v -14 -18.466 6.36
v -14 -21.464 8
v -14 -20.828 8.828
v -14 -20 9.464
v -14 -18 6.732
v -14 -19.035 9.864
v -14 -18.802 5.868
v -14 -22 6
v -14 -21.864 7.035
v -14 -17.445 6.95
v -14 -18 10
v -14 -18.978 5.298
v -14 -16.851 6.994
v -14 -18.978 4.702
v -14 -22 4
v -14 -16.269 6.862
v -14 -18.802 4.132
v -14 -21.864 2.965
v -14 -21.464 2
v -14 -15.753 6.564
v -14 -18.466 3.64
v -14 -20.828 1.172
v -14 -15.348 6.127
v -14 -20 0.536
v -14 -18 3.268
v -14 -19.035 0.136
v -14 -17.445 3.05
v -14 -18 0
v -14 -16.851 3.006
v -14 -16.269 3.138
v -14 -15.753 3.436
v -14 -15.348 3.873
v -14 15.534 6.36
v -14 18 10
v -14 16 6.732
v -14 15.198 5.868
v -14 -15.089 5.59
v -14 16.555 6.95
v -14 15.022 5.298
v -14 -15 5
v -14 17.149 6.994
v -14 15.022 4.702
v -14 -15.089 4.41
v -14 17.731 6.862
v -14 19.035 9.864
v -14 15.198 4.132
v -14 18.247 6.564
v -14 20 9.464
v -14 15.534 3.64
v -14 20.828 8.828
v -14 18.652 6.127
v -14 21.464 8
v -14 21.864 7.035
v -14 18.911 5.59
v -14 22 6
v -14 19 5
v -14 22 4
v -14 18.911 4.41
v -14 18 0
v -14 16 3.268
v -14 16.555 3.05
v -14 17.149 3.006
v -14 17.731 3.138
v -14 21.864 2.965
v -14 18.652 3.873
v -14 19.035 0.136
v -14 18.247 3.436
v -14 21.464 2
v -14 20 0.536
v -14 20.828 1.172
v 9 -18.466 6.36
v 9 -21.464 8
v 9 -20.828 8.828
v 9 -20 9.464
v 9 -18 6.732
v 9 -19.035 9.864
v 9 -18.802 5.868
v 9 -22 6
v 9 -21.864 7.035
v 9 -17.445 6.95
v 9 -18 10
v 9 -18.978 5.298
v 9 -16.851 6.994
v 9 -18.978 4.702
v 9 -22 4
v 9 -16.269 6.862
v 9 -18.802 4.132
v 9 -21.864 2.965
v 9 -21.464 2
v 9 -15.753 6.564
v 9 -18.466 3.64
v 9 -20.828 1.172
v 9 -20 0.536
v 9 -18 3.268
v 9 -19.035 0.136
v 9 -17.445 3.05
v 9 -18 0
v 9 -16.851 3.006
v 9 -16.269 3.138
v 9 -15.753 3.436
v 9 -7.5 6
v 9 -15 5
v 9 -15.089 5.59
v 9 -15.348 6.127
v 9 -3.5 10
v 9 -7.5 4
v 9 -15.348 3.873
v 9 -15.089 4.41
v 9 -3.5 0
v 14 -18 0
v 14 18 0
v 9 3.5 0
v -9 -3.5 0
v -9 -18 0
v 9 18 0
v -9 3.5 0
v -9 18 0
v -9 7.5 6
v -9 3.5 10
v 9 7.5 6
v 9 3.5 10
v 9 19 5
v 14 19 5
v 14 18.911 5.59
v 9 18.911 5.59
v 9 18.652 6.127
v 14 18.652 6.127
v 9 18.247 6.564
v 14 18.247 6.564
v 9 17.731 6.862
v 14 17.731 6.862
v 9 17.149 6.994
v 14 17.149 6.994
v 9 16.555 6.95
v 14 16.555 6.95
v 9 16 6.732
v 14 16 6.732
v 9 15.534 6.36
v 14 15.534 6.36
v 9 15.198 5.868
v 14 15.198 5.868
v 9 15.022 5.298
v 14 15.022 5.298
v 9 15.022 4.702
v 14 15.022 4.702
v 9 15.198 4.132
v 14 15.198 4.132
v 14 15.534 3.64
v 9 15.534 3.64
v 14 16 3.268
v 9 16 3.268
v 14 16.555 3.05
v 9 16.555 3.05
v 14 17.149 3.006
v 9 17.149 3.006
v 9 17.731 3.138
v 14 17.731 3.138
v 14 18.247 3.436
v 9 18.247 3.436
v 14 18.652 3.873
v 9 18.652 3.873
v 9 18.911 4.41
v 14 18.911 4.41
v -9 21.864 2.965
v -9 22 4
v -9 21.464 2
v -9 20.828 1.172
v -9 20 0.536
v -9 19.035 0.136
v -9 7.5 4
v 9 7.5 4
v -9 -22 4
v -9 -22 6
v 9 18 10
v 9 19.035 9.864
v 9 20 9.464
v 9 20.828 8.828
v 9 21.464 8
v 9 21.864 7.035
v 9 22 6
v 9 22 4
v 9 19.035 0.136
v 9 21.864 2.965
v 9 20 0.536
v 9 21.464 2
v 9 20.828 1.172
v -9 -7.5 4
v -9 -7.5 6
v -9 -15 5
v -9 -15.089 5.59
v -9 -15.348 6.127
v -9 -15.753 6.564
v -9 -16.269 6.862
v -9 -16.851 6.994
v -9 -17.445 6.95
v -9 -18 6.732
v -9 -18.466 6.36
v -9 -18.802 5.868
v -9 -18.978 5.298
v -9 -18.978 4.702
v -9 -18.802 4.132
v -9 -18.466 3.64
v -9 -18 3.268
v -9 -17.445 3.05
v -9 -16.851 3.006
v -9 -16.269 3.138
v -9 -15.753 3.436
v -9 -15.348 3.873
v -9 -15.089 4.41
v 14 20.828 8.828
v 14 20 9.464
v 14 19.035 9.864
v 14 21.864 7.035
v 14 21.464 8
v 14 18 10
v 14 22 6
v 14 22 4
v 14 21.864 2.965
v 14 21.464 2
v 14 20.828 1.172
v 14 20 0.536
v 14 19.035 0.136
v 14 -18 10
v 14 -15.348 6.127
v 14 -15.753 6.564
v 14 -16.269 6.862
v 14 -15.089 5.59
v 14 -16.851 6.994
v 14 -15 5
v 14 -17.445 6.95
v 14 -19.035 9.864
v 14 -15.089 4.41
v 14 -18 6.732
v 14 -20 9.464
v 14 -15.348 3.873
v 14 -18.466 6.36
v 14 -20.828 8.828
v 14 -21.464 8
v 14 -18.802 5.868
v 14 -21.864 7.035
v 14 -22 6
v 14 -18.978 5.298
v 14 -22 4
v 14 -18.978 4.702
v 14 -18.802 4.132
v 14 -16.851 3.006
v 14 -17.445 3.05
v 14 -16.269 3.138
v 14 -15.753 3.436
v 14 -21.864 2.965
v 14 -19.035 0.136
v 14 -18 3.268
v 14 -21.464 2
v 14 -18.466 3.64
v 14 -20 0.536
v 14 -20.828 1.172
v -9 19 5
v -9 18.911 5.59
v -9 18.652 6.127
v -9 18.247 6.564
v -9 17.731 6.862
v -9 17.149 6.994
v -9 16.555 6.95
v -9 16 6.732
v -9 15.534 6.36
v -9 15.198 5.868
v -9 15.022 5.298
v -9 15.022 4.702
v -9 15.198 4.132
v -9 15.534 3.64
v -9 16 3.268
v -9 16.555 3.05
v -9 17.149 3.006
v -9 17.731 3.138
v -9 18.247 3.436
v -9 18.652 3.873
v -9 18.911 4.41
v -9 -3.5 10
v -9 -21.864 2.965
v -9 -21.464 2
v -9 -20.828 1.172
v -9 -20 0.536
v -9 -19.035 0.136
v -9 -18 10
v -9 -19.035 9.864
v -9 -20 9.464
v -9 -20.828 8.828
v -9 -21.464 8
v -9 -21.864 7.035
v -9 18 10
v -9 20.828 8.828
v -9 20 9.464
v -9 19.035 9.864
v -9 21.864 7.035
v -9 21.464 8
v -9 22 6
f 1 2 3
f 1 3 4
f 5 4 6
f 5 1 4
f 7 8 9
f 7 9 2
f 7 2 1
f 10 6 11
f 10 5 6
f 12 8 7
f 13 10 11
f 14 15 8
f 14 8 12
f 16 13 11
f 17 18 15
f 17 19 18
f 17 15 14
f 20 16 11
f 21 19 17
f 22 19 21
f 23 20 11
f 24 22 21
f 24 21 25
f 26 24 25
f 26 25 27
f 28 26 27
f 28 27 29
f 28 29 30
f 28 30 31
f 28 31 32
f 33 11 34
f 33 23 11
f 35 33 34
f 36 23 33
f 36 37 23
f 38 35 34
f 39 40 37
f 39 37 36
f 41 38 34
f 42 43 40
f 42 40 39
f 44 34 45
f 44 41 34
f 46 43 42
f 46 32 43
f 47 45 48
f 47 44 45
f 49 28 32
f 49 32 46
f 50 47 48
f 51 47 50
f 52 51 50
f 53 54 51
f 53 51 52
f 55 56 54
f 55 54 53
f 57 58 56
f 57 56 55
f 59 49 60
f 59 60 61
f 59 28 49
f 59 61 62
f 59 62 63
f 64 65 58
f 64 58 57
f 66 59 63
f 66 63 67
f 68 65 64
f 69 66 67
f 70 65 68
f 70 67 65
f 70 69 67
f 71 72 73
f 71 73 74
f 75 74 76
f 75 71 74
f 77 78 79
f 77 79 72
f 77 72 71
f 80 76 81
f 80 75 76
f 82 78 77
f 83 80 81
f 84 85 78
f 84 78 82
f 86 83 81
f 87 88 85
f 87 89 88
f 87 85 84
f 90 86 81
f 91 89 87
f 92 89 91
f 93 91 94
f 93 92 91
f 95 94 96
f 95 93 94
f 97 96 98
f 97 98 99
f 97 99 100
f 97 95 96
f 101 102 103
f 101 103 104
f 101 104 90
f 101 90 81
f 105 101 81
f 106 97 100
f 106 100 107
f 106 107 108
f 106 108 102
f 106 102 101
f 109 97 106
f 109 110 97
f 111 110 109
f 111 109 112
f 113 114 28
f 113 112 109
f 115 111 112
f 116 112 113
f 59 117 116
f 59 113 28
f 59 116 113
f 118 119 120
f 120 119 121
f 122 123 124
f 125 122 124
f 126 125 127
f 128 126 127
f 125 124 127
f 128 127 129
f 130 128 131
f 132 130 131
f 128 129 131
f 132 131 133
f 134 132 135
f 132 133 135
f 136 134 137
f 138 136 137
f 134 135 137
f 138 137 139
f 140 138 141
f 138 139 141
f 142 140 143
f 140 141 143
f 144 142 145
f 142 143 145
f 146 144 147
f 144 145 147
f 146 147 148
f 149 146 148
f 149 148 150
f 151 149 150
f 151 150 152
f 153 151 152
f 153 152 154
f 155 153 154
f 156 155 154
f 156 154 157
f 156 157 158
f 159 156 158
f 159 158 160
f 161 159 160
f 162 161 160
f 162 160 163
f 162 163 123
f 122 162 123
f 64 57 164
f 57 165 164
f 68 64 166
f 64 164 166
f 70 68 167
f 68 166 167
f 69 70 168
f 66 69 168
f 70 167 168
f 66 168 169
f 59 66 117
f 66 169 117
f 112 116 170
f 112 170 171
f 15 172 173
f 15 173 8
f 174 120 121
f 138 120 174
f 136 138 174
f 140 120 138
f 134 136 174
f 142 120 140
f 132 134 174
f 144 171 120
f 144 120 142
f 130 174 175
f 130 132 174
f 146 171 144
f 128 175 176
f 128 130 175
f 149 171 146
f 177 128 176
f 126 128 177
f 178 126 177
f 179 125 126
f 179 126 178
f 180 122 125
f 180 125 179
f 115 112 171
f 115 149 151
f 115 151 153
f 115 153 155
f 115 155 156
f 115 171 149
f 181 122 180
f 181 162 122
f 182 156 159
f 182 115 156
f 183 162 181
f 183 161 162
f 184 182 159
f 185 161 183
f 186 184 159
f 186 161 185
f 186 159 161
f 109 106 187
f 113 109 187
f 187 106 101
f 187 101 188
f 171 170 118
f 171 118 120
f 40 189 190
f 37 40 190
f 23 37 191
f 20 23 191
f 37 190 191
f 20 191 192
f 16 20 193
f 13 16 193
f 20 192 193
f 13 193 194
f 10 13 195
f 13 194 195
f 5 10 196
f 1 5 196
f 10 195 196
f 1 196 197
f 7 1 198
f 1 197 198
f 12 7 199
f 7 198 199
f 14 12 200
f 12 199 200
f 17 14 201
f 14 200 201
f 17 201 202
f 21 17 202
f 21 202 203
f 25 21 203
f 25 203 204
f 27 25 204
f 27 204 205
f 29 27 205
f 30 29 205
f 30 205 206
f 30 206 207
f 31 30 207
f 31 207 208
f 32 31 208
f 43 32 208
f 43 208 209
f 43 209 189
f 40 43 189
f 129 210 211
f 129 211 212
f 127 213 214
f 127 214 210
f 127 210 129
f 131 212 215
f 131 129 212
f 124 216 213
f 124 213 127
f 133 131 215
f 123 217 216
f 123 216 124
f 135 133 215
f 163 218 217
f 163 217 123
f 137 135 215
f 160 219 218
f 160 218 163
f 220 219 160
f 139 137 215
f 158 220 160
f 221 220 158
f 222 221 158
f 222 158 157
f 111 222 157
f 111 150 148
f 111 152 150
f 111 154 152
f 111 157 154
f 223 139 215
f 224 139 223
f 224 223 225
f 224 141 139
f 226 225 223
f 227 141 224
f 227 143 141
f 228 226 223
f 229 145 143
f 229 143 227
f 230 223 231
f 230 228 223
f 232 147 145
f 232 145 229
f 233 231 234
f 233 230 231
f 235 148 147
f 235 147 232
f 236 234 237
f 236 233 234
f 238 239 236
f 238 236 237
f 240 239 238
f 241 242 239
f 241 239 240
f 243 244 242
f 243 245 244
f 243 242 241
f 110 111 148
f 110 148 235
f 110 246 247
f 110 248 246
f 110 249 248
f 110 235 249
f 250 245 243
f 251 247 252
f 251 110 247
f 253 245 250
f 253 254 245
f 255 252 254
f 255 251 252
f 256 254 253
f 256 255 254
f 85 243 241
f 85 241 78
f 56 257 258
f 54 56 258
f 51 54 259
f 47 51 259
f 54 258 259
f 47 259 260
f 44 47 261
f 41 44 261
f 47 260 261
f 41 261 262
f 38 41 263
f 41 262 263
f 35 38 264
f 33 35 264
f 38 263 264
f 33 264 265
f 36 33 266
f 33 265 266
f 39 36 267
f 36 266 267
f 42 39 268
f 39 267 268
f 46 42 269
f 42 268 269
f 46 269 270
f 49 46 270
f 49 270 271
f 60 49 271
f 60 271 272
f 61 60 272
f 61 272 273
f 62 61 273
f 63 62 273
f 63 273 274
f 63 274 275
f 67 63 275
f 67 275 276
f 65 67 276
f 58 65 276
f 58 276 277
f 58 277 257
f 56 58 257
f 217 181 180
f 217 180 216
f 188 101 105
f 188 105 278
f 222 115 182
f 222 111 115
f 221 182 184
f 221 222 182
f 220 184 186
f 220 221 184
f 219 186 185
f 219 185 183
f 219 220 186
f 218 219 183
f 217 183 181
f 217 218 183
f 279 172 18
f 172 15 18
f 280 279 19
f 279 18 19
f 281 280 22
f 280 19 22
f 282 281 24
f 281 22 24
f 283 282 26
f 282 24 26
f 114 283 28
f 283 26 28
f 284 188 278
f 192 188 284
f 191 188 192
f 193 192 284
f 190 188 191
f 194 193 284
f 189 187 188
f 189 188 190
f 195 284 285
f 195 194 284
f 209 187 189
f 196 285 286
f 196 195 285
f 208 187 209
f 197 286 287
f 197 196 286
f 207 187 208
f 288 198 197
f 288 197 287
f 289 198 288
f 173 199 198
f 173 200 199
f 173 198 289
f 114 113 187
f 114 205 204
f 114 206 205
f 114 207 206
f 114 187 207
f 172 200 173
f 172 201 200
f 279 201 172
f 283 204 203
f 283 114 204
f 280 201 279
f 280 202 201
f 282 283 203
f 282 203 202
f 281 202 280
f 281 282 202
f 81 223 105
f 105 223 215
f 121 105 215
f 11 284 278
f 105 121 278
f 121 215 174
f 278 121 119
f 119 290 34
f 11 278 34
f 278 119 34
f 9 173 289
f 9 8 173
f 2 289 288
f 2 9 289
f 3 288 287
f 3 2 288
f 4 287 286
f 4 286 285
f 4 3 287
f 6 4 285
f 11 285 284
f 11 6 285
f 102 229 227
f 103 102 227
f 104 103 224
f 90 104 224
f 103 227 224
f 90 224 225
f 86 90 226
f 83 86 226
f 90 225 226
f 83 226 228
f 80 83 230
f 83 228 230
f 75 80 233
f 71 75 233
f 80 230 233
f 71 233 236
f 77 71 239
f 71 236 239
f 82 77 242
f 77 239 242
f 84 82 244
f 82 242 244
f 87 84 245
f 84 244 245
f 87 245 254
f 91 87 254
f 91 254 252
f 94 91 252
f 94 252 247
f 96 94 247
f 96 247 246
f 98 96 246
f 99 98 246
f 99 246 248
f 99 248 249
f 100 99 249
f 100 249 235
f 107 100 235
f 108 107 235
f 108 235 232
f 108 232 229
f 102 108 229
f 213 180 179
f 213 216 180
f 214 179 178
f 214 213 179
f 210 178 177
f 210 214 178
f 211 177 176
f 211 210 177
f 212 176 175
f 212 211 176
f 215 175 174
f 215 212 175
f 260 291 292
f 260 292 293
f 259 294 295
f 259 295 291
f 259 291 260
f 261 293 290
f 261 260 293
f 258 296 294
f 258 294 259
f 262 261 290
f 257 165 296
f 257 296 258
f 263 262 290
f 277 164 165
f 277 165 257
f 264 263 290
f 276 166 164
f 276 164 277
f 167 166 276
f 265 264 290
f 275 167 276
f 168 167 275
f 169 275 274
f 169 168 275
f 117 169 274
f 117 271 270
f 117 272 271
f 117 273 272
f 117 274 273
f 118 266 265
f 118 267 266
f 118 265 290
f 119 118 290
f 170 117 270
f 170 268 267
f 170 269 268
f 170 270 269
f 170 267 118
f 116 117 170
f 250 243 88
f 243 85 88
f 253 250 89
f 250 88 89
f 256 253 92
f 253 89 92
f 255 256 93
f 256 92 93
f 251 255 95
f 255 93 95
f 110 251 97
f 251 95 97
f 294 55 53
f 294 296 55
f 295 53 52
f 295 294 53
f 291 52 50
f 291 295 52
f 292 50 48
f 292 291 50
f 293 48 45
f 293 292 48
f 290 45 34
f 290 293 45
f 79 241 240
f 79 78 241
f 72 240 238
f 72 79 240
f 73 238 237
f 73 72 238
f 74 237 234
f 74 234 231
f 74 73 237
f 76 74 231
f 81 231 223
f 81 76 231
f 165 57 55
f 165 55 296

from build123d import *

# Parameters (mm, degrees)
PAD_DEPTH    = 10
SKETCH001_R  = 2
POCKET_DEPTH = 31
CHAMFER_SIZE = 4
FILLET_R     = 4


with BuildPart() as part:
    # Sketch → Pad (new body)
    with BuildSketch(Plane.XY):
        Polygon((-9, 7.5), (9, 7.5), (9, 22), (14, 22), (14, -22), (9, -22), (9, -7.5), (-9, -7.5), (-9, -22), (-14, -22), (-14, 22), (-9, 22), align=None)
    extrude(amount=PAD_DEPTH)

    # Sketch001 (on Face4 of Pad) → Pocket (cut)
    with BuildSketch(Plane.YZ.offset(14)):
        with Locations((-17, 5)):
            Circle(SKETCH001_R)
        with Locations((17, 5)):
            Circle(SKETCH001_R)
    extrude(amount=-POCKET_DEPTH, mode=Mode.SUBTRACT)

    # Chamfer
    chamfer_edges = [part.edges().sort_by_distance(p)[0] for p in [
        (0, 7.5, 10),
        (0, -7.5, 10),
        (0, 7.5, 0),
        (0, -7.5, 0),
    ]]
    chamfer(chamfer_edges, length=CHAMFER_SIZE)

    # Fillet
    fillet_edges = [part.edges().sort_by_distance(p)[0] for p in [
        (11.5, 22, 0),
        (-11.5, 22, 0),
        (11.5, 22, 10),
        (-11.5, 22, 10),
        (11.5, -22, 10),
        (-11.5, -22, 10),
        (-11.5, -22, 0),
        (11.5, -22, 0),
    ]]
    fillet(fillet_edges, radius=FILLET_R)


solid = part.part
